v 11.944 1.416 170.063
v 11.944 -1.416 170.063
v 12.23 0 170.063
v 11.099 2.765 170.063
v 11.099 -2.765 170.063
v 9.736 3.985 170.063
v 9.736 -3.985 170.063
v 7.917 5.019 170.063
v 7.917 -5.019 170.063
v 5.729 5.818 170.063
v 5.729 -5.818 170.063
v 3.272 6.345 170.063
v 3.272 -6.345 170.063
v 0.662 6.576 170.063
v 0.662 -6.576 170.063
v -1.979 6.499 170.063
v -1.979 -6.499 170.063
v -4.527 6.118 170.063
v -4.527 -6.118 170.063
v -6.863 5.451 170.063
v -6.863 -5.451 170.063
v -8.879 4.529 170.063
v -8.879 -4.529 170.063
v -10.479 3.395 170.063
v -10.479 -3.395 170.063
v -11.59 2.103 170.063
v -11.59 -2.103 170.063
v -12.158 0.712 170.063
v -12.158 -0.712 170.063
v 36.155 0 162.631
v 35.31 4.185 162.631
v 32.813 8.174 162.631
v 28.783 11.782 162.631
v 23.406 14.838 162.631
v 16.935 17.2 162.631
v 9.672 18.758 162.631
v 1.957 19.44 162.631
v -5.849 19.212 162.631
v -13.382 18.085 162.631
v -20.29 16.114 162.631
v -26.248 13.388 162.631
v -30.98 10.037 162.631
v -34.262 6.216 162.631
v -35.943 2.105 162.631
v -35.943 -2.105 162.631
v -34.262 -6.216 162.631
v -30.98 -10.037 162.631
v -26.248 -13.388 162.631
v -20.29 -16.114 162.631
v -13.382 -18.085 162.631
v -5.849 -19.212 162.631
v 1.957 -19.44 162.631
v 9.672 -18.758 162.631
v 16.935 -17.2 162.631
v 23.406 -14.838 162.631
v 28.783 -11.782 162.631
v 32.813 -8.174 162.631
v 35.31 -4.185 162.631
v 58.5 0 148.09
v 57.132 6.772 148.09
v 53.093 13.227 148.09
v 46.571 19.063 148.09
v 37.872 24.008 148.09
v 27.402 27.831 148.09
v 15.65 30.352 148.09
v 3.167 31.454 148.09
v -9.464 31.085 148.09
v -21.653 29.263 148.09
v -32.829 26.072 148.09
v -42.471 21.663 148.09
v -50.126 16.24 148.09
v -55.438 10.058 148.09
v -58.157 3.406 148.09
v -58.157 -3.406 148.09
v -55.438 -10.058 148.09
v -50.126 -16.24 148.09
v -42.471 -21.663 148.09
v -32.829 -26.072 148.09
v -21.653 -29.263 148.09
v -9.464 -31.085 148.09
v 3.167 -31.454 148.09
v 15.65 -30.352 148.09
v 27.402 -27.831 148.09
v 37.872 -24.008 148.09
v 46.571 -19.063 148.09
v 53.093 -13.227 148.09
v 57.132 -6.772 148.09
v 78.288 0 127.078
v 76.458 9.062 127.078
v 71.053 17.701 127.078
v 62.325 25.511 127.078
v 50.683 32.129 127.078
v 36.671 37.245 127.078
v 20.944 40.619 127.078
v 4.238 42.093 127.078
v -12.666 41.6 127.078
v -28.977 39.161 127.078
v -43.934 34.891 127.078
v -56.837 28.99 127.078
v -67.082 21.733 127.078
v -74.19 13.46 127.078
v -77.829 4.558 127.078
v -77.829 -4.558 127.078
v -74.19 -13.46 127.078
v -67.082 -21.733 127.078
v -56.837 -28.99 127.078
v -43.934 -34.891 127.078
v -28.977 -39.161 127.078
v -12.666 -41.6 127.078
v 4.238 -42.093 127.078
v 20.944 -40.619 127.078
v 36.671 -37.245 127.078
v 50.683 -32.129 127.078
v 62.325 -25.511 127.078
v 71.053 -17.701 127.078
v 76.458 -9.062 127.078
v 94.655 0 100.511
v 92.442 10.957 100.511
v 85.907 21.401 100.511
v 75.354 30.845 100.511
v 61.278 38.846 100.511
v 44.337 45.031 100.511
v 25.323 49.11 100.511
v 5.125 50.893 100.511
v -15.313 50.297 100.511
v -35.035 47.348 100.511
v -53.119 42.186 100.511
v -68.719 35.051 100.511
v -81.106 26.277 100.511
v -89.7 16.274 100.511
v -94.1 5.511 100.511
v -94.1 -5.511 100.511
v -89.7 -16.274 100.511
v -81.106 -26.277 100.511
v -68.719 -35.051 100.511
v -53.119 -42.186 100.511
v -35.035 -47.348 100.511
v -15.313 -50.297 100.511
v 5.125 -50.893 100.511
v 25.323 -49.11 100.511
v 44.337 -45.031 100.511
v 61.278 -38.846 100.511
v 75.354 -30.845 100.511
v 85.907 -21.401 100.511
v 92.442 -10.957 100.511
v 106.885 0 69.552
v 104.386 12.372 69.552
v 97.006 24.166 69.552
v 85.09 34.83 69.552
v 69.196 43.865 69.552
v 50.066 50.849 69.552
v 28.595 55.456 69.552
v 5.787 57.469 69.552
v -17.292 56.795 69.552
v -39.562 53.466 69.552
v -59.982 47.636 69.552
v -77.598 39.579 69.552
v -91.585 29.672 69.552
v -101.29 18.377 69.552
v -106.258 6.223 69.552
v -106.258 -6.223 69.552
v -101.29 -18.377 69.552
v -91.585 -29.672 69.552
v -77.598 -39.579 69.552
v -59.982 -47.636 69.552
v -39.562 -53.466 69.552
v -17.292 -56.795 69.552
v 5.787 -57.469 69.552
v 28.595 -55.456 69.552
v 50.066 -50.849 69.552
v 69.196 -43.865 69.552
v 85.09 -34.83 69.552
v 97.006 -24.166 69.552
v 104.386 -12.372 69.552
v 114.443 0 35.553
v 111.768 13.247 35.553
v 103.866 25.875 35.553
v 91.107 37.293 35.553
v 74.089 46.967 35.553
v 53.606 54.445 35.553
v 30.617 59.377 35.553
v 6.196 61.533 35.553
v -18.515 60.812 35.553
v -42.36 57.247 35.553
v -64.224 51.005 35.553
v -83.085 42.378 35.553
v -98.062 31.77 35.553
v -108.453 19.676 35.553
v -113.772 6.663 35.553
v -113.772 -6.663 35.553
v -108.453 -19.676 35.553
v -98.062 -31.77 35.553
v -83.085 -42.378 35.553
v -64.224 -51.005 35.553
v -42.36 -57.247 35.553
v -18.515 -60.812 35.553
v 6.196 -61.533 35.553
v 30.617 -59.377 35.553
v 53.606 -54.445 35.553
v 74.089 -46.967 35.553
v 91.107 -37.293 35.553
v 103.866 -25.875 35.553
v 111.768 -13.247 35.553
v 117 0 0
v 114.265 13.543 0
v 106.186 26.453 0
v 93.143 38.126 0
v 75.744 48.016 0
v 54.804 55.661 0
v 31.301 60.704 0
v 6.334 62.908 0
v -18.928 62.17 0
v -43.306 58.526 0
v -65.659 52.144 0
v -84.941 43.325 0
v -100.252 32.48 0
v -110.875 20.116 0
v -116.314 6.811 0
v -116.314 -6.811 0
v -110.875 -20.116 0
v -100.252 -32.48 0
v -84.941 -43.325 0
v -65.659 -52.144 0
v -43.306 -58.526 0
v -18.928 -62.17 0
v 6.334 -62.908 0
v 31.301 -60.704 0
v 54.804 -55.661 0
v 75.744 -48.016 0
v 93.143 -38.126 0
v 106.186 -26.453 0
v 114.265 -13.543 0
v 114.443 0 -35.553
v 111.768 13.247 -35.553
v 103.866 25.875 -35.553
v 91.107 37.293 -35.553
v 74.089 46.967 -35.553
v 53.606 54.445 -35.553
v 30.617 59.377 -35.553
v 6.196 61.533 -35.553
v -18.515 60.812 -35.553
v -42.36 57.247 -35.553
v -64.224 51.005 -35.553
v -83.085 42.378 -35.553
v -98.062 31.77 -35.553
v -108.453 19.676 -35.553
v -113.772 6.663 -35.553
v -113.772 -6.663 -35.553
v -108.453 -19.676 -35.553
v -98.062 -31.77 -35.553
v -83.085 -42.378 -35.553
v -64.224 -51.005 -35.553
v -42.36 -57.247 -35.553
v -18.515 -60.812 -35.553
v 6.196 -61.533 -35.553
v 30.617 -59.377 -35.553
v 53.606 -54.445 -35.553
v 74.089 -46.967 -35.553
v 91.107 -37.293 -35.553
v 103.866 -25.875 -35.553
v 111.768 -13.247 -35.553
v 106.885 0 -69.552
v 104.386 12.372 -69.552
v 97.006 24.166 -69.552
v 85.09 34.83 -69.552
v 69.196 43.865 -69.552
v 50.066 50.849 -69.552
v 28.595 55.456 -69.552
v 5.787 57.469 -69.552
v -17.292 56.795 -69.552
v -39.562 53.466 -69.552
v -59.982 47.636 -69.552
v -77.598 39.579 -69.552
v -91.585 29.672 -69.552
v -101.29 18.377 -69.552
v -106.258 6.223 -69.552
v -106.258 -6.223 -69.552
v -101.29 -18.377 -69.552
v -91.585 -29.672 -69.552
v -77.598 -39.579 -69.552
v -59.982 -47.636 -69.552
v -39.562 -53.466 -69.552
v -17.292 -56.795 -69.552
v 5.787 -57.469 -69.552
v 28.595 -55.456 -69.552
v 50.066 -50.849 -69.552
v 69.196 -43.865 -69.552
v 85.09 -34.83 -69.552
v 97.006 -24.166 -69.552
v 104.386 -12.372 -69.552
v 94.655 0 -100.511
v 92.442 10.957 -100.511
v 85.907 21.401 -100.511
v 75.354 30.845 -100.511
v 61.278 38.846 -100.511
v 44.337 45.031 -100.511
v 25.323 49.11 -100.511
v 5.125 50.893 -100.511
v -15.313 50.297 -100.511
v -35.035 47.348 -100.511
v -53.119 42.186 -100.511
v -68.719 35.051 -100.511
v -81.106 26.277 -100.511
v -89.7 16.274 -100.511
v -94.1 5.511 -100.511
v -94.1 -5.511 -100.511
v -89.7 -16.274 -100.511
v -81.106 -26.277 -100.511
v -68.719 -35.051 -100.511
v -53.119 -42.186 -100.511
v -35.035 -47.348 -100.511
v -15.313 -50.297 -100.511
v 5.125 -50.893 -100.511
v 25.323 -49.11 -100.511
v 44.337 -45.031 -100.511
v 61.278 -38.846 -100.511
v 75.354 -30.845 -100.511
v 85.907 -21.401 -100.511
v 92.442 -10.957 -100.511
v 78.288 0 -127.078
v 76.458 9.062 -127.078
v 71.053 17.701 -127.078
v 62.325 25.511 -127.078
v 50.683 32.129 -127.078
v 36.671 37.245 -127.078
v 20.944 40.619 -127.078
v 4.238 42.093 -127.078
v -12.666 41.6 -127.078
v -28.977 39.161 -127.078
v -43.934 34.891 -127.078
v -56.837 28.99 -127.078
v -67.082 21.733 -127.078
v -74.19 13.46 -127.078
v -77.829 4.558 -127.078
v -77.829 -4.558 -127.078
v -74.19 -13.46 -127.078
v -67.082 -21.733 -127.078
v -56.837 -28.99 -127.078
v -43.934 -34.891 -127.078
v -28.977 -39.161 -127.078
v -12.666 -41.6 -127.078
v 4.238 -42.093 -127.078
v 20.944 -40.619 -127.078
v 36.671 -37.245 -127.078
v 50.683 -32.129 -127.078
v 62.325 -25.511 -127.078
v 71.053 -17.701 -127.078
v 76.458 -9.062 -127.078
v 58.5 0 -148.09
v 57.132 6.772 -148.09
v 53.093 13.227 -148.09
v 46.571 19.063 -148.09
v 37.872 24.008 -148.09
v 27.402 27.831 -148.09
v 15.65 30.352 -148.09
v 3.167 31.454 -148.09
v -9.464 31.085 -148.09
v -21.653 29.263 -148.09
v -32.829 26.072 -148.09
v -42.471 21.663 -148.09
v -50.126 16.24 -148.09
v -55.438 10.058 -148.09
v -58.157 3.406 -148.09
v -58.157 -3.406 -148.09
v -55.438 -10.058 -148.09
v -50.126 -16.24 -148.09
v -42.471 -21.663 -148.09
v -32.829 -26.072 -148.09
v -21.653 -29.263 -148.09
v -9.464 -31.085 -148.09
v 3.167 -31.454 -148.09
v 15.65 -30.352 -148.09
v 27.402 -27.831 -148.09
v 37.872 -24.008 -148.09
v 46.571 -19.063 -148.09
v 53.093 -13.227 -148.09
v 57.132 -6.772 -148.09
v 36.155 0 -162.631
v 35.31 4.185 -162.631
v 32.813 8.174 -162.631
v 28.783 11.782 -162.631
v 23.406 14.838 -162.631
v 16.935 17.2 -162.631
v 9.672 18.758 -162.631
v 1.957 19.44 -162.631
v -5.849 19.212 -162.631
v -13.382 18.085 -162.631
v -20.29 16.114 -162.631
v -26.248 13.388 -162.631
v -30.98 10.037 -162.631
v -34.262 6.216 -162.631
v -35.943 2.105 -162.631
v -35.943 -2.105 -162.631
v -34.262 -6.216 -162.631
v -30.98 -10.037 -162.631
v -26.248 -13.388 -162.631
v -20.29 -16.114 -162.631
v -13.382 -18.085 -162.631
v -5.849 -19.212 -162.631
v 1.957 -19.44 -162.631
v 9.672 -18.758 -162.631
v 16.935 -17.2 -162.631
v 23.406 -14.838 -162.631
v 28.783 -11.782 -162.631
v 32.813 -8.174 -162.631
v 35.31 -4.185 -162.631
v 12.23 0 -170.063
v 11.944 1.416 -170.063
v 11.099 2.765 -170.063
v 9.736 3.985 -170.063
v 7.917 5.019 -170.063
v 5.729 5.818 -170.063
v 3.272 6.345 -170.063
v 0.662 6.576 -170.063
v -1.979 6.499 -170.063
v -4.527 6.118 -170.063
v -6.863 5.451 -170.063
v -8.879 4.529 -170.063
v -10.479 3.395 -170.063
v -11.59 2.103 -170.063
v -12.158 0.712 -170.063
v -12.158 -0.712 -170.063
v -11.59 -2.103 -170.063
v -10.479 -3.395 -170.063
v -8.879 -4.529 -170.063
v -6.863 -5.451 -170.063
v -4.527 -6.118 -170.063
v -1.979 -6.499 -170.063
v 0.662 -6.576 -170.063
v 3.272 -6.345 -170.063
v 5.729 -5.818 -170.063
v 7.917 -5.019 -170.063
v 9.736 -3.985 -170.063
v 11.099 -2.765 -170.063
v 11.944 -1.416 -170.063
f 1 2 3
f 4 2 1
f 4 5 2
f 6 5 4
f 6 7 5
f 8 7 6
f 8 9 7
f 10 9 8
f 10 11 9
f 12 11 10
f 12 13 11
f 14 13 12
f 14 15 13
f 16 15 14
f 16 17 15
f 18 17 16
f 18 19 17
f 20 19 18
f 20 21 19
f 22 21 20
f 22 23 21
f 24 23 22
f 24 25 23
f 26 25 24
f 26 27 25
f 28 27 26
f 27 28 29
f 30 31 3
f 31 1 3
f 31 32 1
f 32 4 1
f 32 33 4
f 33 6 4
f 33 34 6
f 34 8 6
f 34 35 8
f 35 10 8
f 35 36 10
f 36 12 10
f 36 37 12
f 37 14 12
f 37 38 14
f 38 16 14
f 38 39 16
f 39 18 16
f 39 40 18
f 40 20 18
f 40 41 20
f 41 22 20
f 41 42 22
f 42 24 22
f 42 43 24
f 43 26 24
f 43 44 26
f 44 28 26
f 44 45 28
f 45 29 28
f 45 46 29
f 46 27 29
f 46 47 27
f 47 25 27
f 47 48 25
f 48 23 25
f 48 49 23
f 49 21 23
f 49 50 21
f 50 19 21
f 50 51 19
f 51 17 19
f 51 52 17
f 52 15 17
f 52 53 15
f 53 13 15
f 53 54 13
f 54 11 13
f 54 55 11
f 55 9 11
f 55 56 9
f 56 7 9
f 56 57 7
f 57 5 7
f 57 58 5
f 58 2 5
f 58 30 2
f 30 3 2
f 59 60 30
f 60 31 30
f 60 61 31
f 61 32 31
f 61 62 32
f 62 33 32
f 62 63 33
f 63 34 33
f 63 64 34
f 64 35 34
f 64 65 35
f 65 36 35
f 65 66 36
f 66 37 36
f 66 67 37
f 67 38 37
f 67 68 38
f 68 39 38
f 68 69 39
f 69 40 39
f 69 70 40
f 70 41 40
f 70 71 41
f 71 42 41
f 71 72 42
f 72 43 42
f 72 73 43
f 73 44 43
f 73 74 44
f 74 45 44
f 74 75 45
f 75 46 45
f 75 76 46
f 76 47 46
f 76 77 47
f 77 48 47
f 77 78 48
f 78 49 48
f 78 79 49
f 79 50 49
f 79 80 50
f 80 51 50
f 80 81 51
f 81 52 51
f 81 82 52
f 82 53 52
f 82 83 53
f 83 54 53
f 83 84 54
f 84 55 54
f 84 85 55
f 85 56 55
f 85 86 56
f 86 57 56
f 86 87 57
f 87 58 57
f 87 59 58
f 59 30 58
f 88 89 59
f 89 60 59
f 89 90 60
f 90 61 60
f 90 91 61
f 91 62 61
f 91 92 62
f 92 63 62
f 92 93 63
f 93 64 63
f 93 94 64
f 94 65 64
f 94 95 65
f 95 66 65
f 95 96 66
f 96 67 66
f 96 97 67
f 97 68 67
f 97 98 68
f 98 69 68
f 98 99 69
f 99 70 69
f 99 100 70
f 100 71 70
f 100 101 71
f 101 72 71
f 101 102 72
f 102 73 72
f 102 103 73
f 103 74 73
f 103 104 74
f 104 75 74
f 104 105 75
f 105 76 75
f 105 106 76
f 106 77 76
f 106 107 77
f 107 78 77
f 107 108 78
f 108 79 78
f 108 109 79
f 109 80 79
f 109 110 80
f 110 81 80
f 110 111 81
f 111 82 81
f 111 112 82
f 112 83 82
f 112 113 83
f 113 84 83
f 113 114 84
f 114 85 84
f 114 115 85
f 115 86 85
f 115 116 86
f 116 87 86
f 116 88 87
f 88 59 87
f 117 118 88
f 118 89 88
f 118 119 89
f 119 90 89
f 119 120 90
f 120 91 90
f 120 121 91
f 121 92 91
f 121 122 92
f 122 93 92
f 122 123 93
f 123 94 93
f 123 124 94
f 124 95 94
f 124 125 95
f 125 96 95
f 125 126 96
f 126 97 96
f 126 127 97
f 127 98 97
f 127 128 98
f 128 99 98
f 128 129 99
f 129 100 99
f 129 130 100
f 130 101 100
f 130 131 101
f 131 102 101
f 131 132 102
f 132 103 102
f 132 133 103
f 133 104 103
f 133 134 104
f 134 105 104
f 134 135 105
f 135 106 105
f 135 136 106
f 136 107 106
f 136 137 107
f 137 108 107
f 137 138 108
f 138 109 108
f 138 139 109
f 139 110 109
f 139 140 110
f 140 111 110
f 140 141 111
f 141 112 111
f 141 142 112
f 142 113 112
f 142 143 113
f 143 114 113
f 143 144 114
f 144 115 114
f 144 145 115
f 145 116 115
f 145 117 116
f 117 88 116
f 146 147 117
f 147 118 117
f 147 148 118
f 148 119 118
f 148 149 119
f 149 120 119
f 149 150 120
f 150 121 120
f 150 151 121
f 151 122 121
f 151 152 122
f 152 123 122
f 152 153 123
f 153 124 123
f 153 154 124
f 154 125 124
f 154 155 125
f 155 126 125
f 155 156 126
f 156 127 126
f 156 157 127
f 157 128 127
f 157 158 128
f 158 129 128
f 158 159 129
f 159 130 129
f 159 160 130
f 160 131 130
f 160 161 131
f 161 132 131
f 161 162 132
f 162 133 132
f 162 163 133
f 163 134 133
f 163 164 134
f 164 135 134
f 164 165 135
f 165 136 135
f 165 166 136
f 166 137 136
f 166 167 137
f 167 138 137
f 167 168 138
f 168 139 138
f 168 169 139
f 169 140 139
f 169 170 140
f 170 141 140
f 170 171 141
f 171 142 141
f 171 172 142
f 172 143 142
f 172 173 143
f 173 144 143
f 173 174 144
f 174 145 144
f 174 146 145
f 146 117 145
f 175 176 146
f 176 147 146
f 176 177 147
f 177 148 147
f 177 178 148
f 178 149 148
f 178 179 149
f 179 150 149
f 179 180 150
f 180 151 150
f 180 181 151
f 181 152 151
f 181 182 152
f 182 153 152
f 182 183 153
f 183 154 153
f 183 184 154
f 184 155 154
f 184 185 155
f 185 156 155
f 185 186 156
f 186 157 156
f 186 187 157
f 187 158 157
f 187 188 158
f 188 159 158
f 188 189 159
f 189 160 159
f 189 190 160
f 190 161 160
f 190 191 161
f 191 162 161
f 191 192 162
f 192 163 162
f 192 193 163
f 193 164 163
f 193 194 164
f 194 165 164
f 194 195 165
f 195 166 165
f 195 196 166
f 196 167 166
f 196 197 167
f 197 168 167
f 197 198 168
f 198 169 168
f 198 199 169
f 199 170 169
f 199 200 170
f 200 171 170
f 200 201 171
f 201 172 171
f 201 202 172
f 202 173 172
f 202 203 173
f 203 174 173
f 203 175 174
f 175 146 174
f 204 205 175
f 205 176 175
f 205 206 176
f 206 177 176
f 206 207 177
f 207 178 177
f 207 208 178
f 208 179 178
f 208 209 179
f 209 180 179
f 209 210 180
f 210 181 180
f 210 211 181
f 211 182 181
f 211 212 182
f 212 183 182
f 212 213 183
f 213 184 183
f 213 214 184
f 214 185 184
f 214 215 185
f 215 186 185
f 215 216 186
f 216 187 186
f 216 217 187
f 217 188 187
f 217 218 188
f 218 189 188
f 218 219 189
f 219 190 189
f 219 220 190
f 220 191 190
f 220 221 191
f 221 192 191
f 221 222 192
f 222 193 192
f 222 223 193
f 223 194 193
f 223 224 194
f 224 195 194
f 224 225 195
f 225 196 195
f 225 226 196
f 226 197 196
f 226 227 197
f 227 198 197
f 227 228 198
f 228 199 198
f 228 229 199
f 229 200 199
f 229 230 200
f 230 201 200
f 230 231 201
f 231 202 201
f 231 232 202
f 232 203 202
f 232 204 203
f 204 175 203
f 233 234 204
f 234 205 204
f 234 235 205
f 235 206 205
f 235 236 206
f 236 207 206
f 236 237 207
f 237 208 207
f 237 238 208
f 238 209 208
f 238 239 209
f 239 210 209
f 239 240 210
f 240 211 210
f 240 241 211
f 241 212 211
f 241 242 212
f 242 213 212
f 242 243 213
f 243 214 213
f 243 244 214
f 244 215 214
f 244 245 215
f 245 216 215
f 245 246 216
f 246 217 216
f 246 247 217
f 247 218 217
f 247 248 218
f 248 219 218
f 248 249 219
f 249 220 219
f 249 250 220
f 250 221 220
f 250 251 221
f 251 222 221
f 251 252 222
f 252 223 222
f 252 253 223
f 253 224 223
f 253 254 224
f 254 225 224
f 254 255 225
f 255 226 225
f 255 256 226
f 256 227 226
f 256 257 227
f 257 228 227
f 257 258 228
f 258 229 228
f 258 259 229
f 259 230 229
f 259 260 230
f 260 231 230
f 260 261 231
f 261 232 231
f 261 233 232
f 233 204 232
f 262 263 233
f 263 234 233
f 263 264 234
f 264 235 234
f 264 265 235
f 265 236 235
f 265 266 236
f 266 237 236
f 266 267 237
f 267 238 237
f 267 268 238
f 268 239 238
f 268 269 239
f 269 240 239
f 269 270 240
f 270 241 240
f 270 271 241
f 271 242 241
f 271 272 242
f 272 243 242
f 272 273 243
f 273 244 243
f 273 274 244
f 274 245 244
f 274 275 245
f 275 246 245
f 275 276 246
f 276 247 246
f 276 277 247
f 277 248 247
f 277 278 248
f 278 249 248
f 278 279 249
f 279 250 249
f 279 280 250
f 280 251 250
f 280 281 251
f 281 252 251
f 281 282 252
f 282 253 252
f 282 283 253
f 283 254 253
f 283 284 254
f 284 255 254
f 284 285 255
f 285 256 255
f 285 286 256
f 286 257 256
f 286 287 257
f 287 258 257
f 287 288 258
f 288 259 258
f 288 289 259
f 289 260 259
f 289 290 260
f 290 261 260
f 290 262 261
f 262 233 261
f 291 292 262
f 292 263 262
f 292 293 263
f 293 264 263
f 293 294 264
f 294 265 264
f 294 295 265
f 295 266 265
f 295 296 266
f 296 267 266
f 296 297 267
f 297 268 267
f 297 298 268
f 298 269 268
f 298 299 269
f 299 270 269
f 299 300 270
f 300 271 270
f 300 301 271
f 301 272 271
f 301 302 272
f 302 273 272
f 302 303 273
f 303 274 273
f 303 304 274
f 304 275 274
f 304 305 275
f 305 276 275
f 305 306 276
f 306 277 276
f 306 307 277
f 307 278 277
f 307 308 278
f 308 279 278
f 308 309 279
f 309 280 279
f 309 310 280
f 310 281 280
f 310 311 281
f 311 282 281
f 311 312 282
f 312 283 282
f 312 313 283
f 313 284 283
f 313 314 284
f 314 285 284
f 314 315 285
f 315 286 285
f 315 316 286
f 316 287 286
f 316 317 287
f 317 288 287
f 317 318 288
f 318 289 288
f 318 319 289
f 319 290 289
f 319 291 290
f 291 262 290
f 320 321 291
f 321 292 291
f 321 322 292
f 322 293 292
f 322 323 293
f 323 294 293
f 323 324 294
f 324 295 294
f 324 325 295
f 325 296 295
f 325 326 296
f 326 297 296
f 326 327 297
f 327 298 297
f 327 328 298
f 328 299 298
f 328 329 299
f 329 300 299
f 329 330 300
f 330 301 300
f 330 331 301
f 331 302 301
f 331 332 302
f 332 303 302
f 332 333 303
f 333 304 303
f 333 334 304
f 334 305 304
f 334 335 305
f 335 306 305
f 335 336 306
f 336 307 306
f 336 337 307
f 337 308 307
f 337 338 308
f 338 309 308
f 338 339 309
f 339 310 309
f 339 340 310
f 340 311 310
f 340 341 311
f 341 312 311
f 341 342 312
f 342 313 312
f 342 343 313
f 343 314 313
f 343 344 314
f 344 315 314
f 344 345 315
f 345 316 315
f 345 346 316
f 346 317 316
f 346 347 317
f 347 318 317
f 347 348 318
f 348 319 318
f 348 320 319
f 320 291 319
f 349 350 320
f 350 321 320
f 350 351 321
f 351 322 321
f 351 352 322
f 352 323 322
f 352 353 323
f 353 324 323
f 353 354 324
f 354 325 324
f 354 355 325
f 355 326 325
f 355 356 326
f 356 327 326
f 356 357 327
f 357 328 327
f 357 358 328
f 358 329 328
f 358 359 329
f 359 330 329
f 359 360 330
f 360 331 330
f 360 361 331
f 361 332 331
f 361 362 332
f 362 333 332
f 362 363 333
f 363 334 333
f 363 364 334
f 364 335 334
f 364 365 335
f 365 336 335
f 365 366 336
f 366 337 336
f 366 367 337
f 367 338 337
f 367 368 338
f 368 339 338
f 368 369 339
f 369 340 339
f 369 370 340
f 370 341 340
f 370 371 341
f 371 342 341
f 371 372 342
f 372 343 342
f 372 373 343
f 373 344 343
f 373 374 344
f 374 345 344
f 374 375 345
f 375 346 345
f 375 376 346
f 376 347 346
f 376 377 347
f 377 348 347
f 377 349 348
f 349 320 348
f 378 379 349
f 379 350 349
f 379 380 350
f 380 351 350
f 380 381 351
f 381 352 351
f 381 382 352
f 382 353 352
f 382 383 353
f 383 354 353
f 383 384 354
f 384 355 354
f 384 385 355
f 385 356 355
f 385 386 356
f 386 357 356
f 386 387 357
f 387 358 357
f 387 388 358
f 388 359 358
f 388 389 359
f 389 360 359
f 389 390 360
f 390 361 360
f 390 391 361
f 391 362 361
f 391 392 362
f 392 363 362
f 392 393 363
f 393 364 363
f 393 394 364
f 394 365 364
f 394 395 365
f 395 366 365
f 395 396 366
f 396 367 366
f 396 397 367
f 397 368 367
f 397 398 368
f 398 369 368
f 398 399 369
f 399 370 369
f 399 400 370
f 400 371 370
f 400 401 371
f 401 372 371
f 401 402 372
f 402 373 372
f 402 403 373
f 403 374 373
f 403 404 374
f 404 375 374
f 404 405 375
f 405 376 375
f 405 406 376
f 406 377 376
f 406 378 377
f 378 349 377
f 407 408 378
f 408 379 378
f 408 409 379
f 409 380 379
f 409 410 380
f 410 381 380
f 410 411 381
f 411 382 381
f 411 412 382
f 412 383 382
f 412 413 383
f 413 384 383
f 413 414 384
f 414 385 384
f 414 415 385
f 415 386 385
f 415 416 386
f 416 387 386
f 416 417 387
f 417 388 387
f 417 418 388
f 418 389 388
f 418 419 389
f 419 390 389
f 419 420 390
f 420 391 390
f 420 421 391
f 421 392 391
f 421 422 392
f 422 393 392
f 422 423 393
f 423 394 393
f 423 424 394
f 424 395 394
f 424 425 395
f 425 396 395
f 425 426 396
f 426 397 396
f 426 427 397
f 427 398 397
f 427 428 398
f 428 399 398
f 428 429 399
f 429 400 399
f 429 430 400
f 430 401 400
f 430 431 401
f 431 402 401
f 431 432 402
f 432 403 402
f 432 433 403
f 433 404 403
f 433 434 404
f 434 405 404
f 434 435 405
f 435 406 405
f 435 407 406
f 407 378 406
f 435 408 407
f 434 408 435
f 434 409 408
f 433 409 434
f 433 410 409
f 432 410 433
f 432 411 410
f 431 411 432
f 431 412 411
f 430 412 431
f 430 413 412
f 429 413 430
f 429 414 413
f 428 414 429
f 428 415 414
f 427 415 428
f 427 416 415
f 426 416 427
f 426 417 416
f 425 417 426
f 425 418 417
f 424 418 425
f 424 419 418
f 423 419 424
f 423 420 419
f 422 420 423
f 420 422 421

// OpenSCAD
// Generated by SolidPython 1.0.1 on 2020-07-29 00:46:50


scale(v = [13, 7, 19]) {
	sphere(r = 9);
}
/***********************************************
*********      SolidPython code:      **********
************************************************
 
# import packages: SolidPython
from solid import *
from solid.utils import *
from itertools import chain, combinations, permutations


class Resize:

    def __init__(self, scad_file):
        self.scad_file = scad_file
        #self.scad_file = import_scad(scad_file)
        # cone/cylinder param:
        self.r1 = 0
        self.r2 = 0
        self.h = 0
        # rectangular prism param:
        self.w = 0
        self.l = 0
        # ellipse param:
        self.r = 0

    # import OpenScad code (file name corresponds to shape)


    # classify shape + parameters
    def assign(self, param1, param2, param3):
        if self.scad_file == 'cone.scad':
            self.r1 = param1
            self.r2 = param2
            self.h = param3
        elif self.scad_file == 'cylinder.scad':
            self.r1 = param1
            self.r2 = param2
            self.h = param3
        elif self.scad_file == 'rectangularPrism.scad':
            self.h = param1
            self.l = param2
            self.w = param3
        else:
            self.r = param1
            self.h = param2

    # resize parameters
    def iterate(self):
        x = range(3, 20, 2)
        i = 1
        if self.scad_file == 'cone.scad':
            tempList = list(permutations(x, 2))
            for temp in tempList:
                param1 = temp[0]
                param2 = temp[1]
                filepath = 'produced_scad_files/' + 'cone' + str(param1) + '_' + str(param2) + '_' + '.scad'
                scad_render_to_file(cylinder(h=param1, r1=param2, r2=0), filepath)

        elif self.scad_file == 'cylinder.scad':
            tempList = list(permutations(x, 3))
            for temp in tempList:
                param1 = temp[0]
                param2 = temp[1]
                filepath = 'produced_scad_files/' + 'cylinder' + str(param1) + '_' + str(param2) + '_' + '.scad'
                scad_render_to_file(cylinder(h=param1, r1=param2, r2=param2), filepath)

        elif self.scad_file == 'rectangularPrism.scad':
            tempList = list(permutations(x, 3))
            for temp in tempList:
                param1 = temp[0]
                param2 = temp[1]
                param3 = temp[2]
                filepath = 'produced_scad_files/' + 'rectangularPrism' + str(param1) + '_' + str(param2) + '_' + str(
                    param3) + '.scad'
                scad_render_to_file(cube(size=(param1, param2, param3)), filepath)

        elif self.scad_file == 'ellipse.scad':
            tempList = list(permutations(x, 4))
            for temp in tempList:
                param1 = temp[0]
                param2 = temp[1]
                param3 = temp[2]
                param4 = temp[3]
                filepath = 'produced_scad_files/' + 'ellipse' + str(param1) + '_' + str(param2) + '_' + str(param3) + '_' + str(param4) + '.scad'
                scad_render_to_file(scale([param1, param2, param3])(sphere(r=param4)), filepath)

    def render_to_scadfile(self):
        scad_render_to_file(scad, 'example.scad') 
 
************************************************/
